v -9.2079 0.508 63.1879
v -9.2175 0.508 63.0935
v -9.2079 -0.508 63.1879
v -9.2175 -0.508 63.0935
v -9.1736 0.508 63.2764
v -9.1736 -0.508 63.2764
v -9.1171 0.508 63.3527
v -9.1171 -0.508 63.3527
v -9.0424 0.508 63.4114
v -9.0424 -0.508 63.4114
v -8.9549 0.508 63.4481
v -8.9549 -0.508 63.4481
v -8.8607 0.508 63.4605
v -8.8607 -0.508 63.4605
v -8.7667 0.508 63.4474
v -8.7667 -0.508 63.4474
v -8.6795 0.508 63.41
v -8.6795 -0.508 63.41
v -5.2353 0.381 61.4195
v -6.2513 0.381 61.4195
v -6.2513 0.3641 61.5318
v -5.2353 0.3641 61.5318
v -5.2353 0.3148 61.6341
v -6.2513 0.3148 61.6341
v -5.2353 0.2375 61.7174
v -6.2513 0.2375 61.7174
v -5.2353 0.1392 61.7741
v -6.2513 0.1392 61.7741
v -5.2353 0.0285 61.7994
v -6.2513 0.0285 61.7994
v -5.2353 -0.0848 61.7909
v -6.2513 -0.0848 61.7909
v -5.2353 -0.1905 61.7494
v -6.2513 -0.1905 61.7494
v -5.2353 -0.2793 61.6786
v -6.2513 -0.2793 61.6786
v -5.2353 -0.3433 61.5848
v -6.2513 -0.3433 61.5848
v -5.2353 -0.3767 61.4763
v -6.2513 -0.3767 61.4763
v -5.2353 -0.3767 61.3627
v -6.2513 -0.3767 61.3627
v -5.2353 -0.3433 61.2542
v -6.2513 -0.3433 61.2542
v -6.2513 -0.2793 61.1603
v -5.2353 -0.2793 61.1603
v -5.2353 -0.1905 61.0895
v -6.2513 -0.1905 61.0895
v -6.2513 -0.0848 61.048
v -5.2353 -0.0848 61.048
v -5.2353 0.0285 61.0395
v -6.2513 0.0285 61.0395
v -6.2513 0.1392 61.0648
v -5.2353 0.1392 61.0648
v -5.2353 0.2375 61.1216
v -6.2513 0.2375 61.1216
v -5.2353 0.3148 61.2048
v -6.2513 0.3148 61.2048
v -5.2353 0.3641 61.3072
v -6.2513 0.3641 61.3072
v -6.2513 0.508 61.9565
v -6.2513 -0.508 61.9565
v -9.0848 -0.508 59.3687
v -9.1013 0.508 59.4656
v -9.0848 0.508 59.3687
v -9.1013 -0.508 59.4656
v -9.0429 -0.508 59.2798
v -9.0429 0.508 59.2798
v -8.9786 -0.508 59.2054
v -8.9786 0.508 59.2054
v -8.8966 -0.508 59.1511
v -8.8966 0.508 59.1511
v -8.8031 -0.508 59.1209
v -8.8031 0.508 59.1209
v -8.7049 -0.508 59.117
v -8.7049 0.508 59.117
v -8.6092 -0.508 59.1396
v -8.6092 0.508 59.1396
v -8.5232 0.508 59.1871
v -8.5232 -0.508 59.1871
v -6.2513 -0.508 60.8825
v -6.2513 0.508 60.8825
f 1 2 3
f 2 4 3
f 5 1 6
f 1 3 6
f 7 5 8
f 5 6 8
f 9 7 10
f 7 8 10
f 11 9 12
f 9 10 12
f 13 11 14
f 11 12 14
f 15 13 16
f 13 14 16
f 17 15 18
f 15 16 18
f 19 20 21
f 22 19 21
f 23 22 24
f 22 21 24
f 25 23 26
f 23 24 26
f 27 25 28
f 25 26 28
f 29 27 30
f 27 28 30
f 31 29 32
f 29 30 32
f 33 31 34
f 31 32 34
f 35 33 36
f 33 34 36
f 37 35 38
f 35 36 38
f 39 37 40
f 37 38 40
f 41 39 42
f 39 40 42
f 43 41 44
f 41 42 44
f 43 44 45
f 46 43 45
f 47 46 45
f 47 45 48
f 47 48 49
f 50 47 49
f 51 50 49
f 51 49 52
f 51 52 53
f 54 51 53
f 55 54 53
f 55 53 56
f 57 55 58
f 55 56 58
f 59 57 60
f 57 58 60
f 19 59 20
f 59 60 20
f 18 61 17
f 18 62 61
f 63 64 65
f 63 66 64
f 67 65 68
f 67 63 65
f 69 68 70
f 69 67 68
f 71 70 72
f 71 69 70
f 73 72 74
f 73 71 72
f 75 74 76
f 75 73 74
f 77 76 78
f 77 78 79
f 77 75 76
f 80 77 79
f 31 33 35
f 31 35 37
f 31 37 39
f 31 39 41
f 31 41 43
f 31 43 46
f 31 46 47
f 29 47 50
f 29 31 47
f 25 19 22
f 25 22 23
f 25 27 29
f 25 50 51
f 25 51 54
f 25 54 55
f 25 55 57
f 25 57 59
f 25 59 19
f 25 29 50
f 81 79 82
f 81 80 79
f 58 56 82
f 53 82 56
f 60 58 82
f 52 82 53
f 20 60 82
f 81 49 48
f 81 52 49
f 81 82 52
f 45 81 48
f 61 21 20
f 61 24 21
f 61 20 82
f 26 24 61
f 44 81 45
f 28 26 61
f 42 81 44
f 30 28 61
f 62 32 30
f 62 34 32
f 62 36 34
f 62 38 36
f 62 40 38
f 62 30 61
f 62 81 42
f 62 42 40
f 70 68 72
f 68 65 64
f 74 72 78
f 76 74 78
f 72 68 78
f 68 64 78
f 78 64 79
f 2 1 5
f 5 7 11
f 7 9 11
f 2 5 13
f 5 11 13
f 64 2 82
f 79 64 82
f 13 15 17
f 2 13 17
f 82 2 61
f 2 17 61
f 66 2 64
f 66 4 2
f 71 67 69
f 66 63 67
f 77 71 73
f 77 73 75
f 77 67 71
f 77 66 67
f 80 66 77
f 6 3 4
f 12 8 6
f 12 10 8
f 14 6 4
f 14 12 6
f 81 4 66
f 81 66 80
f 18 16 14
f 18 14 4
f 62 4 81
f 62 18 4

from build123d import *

# Parameters (mm, degrees)
F1_DEPTH = 0.508
F2_R     = 0.381
F3_DEPTH = 1.016
F4_R     = 0.3618562266
F5_R     = 0.3556


with BuildPart() as f1:
    # F0 (on Front) → F1 (new body, symmetric)
    with BuildSketch(Plane.XZ):
        Polygon((-6.2513332814, 61.9564950466), (-9.2383846641, 63.7445375323), (-9.0790754184, 58.7723441422), (-6.2513332814, 60.8824528754), align=None)
    extrude(amount=F1_DEPTH, both=True)

    # F2 (on face) → F3 (join)
    with BuildSketch(Plane.YZ.offset(-6.2513332814)):
        with Locations((0, 61.419473961)):
            Circle(F2_R)
    extrude(amount=F3_DEPTH)

    # F4
    f4_edges = [f1.edges().sort_by_distance(p)[0] for p in [
        (-9.079075, 0, 58.772344),
    ]]
    fillet(f4_edges, radius=F4_R)

    # F5
    f5_edges = [f1.edges().sort_by_distance(p)[0] for p in [
        (-9.238385, 0, 63.744538),
    ]]
    fillet(f5_edges, radius=F5_R)


solid = f1.part
